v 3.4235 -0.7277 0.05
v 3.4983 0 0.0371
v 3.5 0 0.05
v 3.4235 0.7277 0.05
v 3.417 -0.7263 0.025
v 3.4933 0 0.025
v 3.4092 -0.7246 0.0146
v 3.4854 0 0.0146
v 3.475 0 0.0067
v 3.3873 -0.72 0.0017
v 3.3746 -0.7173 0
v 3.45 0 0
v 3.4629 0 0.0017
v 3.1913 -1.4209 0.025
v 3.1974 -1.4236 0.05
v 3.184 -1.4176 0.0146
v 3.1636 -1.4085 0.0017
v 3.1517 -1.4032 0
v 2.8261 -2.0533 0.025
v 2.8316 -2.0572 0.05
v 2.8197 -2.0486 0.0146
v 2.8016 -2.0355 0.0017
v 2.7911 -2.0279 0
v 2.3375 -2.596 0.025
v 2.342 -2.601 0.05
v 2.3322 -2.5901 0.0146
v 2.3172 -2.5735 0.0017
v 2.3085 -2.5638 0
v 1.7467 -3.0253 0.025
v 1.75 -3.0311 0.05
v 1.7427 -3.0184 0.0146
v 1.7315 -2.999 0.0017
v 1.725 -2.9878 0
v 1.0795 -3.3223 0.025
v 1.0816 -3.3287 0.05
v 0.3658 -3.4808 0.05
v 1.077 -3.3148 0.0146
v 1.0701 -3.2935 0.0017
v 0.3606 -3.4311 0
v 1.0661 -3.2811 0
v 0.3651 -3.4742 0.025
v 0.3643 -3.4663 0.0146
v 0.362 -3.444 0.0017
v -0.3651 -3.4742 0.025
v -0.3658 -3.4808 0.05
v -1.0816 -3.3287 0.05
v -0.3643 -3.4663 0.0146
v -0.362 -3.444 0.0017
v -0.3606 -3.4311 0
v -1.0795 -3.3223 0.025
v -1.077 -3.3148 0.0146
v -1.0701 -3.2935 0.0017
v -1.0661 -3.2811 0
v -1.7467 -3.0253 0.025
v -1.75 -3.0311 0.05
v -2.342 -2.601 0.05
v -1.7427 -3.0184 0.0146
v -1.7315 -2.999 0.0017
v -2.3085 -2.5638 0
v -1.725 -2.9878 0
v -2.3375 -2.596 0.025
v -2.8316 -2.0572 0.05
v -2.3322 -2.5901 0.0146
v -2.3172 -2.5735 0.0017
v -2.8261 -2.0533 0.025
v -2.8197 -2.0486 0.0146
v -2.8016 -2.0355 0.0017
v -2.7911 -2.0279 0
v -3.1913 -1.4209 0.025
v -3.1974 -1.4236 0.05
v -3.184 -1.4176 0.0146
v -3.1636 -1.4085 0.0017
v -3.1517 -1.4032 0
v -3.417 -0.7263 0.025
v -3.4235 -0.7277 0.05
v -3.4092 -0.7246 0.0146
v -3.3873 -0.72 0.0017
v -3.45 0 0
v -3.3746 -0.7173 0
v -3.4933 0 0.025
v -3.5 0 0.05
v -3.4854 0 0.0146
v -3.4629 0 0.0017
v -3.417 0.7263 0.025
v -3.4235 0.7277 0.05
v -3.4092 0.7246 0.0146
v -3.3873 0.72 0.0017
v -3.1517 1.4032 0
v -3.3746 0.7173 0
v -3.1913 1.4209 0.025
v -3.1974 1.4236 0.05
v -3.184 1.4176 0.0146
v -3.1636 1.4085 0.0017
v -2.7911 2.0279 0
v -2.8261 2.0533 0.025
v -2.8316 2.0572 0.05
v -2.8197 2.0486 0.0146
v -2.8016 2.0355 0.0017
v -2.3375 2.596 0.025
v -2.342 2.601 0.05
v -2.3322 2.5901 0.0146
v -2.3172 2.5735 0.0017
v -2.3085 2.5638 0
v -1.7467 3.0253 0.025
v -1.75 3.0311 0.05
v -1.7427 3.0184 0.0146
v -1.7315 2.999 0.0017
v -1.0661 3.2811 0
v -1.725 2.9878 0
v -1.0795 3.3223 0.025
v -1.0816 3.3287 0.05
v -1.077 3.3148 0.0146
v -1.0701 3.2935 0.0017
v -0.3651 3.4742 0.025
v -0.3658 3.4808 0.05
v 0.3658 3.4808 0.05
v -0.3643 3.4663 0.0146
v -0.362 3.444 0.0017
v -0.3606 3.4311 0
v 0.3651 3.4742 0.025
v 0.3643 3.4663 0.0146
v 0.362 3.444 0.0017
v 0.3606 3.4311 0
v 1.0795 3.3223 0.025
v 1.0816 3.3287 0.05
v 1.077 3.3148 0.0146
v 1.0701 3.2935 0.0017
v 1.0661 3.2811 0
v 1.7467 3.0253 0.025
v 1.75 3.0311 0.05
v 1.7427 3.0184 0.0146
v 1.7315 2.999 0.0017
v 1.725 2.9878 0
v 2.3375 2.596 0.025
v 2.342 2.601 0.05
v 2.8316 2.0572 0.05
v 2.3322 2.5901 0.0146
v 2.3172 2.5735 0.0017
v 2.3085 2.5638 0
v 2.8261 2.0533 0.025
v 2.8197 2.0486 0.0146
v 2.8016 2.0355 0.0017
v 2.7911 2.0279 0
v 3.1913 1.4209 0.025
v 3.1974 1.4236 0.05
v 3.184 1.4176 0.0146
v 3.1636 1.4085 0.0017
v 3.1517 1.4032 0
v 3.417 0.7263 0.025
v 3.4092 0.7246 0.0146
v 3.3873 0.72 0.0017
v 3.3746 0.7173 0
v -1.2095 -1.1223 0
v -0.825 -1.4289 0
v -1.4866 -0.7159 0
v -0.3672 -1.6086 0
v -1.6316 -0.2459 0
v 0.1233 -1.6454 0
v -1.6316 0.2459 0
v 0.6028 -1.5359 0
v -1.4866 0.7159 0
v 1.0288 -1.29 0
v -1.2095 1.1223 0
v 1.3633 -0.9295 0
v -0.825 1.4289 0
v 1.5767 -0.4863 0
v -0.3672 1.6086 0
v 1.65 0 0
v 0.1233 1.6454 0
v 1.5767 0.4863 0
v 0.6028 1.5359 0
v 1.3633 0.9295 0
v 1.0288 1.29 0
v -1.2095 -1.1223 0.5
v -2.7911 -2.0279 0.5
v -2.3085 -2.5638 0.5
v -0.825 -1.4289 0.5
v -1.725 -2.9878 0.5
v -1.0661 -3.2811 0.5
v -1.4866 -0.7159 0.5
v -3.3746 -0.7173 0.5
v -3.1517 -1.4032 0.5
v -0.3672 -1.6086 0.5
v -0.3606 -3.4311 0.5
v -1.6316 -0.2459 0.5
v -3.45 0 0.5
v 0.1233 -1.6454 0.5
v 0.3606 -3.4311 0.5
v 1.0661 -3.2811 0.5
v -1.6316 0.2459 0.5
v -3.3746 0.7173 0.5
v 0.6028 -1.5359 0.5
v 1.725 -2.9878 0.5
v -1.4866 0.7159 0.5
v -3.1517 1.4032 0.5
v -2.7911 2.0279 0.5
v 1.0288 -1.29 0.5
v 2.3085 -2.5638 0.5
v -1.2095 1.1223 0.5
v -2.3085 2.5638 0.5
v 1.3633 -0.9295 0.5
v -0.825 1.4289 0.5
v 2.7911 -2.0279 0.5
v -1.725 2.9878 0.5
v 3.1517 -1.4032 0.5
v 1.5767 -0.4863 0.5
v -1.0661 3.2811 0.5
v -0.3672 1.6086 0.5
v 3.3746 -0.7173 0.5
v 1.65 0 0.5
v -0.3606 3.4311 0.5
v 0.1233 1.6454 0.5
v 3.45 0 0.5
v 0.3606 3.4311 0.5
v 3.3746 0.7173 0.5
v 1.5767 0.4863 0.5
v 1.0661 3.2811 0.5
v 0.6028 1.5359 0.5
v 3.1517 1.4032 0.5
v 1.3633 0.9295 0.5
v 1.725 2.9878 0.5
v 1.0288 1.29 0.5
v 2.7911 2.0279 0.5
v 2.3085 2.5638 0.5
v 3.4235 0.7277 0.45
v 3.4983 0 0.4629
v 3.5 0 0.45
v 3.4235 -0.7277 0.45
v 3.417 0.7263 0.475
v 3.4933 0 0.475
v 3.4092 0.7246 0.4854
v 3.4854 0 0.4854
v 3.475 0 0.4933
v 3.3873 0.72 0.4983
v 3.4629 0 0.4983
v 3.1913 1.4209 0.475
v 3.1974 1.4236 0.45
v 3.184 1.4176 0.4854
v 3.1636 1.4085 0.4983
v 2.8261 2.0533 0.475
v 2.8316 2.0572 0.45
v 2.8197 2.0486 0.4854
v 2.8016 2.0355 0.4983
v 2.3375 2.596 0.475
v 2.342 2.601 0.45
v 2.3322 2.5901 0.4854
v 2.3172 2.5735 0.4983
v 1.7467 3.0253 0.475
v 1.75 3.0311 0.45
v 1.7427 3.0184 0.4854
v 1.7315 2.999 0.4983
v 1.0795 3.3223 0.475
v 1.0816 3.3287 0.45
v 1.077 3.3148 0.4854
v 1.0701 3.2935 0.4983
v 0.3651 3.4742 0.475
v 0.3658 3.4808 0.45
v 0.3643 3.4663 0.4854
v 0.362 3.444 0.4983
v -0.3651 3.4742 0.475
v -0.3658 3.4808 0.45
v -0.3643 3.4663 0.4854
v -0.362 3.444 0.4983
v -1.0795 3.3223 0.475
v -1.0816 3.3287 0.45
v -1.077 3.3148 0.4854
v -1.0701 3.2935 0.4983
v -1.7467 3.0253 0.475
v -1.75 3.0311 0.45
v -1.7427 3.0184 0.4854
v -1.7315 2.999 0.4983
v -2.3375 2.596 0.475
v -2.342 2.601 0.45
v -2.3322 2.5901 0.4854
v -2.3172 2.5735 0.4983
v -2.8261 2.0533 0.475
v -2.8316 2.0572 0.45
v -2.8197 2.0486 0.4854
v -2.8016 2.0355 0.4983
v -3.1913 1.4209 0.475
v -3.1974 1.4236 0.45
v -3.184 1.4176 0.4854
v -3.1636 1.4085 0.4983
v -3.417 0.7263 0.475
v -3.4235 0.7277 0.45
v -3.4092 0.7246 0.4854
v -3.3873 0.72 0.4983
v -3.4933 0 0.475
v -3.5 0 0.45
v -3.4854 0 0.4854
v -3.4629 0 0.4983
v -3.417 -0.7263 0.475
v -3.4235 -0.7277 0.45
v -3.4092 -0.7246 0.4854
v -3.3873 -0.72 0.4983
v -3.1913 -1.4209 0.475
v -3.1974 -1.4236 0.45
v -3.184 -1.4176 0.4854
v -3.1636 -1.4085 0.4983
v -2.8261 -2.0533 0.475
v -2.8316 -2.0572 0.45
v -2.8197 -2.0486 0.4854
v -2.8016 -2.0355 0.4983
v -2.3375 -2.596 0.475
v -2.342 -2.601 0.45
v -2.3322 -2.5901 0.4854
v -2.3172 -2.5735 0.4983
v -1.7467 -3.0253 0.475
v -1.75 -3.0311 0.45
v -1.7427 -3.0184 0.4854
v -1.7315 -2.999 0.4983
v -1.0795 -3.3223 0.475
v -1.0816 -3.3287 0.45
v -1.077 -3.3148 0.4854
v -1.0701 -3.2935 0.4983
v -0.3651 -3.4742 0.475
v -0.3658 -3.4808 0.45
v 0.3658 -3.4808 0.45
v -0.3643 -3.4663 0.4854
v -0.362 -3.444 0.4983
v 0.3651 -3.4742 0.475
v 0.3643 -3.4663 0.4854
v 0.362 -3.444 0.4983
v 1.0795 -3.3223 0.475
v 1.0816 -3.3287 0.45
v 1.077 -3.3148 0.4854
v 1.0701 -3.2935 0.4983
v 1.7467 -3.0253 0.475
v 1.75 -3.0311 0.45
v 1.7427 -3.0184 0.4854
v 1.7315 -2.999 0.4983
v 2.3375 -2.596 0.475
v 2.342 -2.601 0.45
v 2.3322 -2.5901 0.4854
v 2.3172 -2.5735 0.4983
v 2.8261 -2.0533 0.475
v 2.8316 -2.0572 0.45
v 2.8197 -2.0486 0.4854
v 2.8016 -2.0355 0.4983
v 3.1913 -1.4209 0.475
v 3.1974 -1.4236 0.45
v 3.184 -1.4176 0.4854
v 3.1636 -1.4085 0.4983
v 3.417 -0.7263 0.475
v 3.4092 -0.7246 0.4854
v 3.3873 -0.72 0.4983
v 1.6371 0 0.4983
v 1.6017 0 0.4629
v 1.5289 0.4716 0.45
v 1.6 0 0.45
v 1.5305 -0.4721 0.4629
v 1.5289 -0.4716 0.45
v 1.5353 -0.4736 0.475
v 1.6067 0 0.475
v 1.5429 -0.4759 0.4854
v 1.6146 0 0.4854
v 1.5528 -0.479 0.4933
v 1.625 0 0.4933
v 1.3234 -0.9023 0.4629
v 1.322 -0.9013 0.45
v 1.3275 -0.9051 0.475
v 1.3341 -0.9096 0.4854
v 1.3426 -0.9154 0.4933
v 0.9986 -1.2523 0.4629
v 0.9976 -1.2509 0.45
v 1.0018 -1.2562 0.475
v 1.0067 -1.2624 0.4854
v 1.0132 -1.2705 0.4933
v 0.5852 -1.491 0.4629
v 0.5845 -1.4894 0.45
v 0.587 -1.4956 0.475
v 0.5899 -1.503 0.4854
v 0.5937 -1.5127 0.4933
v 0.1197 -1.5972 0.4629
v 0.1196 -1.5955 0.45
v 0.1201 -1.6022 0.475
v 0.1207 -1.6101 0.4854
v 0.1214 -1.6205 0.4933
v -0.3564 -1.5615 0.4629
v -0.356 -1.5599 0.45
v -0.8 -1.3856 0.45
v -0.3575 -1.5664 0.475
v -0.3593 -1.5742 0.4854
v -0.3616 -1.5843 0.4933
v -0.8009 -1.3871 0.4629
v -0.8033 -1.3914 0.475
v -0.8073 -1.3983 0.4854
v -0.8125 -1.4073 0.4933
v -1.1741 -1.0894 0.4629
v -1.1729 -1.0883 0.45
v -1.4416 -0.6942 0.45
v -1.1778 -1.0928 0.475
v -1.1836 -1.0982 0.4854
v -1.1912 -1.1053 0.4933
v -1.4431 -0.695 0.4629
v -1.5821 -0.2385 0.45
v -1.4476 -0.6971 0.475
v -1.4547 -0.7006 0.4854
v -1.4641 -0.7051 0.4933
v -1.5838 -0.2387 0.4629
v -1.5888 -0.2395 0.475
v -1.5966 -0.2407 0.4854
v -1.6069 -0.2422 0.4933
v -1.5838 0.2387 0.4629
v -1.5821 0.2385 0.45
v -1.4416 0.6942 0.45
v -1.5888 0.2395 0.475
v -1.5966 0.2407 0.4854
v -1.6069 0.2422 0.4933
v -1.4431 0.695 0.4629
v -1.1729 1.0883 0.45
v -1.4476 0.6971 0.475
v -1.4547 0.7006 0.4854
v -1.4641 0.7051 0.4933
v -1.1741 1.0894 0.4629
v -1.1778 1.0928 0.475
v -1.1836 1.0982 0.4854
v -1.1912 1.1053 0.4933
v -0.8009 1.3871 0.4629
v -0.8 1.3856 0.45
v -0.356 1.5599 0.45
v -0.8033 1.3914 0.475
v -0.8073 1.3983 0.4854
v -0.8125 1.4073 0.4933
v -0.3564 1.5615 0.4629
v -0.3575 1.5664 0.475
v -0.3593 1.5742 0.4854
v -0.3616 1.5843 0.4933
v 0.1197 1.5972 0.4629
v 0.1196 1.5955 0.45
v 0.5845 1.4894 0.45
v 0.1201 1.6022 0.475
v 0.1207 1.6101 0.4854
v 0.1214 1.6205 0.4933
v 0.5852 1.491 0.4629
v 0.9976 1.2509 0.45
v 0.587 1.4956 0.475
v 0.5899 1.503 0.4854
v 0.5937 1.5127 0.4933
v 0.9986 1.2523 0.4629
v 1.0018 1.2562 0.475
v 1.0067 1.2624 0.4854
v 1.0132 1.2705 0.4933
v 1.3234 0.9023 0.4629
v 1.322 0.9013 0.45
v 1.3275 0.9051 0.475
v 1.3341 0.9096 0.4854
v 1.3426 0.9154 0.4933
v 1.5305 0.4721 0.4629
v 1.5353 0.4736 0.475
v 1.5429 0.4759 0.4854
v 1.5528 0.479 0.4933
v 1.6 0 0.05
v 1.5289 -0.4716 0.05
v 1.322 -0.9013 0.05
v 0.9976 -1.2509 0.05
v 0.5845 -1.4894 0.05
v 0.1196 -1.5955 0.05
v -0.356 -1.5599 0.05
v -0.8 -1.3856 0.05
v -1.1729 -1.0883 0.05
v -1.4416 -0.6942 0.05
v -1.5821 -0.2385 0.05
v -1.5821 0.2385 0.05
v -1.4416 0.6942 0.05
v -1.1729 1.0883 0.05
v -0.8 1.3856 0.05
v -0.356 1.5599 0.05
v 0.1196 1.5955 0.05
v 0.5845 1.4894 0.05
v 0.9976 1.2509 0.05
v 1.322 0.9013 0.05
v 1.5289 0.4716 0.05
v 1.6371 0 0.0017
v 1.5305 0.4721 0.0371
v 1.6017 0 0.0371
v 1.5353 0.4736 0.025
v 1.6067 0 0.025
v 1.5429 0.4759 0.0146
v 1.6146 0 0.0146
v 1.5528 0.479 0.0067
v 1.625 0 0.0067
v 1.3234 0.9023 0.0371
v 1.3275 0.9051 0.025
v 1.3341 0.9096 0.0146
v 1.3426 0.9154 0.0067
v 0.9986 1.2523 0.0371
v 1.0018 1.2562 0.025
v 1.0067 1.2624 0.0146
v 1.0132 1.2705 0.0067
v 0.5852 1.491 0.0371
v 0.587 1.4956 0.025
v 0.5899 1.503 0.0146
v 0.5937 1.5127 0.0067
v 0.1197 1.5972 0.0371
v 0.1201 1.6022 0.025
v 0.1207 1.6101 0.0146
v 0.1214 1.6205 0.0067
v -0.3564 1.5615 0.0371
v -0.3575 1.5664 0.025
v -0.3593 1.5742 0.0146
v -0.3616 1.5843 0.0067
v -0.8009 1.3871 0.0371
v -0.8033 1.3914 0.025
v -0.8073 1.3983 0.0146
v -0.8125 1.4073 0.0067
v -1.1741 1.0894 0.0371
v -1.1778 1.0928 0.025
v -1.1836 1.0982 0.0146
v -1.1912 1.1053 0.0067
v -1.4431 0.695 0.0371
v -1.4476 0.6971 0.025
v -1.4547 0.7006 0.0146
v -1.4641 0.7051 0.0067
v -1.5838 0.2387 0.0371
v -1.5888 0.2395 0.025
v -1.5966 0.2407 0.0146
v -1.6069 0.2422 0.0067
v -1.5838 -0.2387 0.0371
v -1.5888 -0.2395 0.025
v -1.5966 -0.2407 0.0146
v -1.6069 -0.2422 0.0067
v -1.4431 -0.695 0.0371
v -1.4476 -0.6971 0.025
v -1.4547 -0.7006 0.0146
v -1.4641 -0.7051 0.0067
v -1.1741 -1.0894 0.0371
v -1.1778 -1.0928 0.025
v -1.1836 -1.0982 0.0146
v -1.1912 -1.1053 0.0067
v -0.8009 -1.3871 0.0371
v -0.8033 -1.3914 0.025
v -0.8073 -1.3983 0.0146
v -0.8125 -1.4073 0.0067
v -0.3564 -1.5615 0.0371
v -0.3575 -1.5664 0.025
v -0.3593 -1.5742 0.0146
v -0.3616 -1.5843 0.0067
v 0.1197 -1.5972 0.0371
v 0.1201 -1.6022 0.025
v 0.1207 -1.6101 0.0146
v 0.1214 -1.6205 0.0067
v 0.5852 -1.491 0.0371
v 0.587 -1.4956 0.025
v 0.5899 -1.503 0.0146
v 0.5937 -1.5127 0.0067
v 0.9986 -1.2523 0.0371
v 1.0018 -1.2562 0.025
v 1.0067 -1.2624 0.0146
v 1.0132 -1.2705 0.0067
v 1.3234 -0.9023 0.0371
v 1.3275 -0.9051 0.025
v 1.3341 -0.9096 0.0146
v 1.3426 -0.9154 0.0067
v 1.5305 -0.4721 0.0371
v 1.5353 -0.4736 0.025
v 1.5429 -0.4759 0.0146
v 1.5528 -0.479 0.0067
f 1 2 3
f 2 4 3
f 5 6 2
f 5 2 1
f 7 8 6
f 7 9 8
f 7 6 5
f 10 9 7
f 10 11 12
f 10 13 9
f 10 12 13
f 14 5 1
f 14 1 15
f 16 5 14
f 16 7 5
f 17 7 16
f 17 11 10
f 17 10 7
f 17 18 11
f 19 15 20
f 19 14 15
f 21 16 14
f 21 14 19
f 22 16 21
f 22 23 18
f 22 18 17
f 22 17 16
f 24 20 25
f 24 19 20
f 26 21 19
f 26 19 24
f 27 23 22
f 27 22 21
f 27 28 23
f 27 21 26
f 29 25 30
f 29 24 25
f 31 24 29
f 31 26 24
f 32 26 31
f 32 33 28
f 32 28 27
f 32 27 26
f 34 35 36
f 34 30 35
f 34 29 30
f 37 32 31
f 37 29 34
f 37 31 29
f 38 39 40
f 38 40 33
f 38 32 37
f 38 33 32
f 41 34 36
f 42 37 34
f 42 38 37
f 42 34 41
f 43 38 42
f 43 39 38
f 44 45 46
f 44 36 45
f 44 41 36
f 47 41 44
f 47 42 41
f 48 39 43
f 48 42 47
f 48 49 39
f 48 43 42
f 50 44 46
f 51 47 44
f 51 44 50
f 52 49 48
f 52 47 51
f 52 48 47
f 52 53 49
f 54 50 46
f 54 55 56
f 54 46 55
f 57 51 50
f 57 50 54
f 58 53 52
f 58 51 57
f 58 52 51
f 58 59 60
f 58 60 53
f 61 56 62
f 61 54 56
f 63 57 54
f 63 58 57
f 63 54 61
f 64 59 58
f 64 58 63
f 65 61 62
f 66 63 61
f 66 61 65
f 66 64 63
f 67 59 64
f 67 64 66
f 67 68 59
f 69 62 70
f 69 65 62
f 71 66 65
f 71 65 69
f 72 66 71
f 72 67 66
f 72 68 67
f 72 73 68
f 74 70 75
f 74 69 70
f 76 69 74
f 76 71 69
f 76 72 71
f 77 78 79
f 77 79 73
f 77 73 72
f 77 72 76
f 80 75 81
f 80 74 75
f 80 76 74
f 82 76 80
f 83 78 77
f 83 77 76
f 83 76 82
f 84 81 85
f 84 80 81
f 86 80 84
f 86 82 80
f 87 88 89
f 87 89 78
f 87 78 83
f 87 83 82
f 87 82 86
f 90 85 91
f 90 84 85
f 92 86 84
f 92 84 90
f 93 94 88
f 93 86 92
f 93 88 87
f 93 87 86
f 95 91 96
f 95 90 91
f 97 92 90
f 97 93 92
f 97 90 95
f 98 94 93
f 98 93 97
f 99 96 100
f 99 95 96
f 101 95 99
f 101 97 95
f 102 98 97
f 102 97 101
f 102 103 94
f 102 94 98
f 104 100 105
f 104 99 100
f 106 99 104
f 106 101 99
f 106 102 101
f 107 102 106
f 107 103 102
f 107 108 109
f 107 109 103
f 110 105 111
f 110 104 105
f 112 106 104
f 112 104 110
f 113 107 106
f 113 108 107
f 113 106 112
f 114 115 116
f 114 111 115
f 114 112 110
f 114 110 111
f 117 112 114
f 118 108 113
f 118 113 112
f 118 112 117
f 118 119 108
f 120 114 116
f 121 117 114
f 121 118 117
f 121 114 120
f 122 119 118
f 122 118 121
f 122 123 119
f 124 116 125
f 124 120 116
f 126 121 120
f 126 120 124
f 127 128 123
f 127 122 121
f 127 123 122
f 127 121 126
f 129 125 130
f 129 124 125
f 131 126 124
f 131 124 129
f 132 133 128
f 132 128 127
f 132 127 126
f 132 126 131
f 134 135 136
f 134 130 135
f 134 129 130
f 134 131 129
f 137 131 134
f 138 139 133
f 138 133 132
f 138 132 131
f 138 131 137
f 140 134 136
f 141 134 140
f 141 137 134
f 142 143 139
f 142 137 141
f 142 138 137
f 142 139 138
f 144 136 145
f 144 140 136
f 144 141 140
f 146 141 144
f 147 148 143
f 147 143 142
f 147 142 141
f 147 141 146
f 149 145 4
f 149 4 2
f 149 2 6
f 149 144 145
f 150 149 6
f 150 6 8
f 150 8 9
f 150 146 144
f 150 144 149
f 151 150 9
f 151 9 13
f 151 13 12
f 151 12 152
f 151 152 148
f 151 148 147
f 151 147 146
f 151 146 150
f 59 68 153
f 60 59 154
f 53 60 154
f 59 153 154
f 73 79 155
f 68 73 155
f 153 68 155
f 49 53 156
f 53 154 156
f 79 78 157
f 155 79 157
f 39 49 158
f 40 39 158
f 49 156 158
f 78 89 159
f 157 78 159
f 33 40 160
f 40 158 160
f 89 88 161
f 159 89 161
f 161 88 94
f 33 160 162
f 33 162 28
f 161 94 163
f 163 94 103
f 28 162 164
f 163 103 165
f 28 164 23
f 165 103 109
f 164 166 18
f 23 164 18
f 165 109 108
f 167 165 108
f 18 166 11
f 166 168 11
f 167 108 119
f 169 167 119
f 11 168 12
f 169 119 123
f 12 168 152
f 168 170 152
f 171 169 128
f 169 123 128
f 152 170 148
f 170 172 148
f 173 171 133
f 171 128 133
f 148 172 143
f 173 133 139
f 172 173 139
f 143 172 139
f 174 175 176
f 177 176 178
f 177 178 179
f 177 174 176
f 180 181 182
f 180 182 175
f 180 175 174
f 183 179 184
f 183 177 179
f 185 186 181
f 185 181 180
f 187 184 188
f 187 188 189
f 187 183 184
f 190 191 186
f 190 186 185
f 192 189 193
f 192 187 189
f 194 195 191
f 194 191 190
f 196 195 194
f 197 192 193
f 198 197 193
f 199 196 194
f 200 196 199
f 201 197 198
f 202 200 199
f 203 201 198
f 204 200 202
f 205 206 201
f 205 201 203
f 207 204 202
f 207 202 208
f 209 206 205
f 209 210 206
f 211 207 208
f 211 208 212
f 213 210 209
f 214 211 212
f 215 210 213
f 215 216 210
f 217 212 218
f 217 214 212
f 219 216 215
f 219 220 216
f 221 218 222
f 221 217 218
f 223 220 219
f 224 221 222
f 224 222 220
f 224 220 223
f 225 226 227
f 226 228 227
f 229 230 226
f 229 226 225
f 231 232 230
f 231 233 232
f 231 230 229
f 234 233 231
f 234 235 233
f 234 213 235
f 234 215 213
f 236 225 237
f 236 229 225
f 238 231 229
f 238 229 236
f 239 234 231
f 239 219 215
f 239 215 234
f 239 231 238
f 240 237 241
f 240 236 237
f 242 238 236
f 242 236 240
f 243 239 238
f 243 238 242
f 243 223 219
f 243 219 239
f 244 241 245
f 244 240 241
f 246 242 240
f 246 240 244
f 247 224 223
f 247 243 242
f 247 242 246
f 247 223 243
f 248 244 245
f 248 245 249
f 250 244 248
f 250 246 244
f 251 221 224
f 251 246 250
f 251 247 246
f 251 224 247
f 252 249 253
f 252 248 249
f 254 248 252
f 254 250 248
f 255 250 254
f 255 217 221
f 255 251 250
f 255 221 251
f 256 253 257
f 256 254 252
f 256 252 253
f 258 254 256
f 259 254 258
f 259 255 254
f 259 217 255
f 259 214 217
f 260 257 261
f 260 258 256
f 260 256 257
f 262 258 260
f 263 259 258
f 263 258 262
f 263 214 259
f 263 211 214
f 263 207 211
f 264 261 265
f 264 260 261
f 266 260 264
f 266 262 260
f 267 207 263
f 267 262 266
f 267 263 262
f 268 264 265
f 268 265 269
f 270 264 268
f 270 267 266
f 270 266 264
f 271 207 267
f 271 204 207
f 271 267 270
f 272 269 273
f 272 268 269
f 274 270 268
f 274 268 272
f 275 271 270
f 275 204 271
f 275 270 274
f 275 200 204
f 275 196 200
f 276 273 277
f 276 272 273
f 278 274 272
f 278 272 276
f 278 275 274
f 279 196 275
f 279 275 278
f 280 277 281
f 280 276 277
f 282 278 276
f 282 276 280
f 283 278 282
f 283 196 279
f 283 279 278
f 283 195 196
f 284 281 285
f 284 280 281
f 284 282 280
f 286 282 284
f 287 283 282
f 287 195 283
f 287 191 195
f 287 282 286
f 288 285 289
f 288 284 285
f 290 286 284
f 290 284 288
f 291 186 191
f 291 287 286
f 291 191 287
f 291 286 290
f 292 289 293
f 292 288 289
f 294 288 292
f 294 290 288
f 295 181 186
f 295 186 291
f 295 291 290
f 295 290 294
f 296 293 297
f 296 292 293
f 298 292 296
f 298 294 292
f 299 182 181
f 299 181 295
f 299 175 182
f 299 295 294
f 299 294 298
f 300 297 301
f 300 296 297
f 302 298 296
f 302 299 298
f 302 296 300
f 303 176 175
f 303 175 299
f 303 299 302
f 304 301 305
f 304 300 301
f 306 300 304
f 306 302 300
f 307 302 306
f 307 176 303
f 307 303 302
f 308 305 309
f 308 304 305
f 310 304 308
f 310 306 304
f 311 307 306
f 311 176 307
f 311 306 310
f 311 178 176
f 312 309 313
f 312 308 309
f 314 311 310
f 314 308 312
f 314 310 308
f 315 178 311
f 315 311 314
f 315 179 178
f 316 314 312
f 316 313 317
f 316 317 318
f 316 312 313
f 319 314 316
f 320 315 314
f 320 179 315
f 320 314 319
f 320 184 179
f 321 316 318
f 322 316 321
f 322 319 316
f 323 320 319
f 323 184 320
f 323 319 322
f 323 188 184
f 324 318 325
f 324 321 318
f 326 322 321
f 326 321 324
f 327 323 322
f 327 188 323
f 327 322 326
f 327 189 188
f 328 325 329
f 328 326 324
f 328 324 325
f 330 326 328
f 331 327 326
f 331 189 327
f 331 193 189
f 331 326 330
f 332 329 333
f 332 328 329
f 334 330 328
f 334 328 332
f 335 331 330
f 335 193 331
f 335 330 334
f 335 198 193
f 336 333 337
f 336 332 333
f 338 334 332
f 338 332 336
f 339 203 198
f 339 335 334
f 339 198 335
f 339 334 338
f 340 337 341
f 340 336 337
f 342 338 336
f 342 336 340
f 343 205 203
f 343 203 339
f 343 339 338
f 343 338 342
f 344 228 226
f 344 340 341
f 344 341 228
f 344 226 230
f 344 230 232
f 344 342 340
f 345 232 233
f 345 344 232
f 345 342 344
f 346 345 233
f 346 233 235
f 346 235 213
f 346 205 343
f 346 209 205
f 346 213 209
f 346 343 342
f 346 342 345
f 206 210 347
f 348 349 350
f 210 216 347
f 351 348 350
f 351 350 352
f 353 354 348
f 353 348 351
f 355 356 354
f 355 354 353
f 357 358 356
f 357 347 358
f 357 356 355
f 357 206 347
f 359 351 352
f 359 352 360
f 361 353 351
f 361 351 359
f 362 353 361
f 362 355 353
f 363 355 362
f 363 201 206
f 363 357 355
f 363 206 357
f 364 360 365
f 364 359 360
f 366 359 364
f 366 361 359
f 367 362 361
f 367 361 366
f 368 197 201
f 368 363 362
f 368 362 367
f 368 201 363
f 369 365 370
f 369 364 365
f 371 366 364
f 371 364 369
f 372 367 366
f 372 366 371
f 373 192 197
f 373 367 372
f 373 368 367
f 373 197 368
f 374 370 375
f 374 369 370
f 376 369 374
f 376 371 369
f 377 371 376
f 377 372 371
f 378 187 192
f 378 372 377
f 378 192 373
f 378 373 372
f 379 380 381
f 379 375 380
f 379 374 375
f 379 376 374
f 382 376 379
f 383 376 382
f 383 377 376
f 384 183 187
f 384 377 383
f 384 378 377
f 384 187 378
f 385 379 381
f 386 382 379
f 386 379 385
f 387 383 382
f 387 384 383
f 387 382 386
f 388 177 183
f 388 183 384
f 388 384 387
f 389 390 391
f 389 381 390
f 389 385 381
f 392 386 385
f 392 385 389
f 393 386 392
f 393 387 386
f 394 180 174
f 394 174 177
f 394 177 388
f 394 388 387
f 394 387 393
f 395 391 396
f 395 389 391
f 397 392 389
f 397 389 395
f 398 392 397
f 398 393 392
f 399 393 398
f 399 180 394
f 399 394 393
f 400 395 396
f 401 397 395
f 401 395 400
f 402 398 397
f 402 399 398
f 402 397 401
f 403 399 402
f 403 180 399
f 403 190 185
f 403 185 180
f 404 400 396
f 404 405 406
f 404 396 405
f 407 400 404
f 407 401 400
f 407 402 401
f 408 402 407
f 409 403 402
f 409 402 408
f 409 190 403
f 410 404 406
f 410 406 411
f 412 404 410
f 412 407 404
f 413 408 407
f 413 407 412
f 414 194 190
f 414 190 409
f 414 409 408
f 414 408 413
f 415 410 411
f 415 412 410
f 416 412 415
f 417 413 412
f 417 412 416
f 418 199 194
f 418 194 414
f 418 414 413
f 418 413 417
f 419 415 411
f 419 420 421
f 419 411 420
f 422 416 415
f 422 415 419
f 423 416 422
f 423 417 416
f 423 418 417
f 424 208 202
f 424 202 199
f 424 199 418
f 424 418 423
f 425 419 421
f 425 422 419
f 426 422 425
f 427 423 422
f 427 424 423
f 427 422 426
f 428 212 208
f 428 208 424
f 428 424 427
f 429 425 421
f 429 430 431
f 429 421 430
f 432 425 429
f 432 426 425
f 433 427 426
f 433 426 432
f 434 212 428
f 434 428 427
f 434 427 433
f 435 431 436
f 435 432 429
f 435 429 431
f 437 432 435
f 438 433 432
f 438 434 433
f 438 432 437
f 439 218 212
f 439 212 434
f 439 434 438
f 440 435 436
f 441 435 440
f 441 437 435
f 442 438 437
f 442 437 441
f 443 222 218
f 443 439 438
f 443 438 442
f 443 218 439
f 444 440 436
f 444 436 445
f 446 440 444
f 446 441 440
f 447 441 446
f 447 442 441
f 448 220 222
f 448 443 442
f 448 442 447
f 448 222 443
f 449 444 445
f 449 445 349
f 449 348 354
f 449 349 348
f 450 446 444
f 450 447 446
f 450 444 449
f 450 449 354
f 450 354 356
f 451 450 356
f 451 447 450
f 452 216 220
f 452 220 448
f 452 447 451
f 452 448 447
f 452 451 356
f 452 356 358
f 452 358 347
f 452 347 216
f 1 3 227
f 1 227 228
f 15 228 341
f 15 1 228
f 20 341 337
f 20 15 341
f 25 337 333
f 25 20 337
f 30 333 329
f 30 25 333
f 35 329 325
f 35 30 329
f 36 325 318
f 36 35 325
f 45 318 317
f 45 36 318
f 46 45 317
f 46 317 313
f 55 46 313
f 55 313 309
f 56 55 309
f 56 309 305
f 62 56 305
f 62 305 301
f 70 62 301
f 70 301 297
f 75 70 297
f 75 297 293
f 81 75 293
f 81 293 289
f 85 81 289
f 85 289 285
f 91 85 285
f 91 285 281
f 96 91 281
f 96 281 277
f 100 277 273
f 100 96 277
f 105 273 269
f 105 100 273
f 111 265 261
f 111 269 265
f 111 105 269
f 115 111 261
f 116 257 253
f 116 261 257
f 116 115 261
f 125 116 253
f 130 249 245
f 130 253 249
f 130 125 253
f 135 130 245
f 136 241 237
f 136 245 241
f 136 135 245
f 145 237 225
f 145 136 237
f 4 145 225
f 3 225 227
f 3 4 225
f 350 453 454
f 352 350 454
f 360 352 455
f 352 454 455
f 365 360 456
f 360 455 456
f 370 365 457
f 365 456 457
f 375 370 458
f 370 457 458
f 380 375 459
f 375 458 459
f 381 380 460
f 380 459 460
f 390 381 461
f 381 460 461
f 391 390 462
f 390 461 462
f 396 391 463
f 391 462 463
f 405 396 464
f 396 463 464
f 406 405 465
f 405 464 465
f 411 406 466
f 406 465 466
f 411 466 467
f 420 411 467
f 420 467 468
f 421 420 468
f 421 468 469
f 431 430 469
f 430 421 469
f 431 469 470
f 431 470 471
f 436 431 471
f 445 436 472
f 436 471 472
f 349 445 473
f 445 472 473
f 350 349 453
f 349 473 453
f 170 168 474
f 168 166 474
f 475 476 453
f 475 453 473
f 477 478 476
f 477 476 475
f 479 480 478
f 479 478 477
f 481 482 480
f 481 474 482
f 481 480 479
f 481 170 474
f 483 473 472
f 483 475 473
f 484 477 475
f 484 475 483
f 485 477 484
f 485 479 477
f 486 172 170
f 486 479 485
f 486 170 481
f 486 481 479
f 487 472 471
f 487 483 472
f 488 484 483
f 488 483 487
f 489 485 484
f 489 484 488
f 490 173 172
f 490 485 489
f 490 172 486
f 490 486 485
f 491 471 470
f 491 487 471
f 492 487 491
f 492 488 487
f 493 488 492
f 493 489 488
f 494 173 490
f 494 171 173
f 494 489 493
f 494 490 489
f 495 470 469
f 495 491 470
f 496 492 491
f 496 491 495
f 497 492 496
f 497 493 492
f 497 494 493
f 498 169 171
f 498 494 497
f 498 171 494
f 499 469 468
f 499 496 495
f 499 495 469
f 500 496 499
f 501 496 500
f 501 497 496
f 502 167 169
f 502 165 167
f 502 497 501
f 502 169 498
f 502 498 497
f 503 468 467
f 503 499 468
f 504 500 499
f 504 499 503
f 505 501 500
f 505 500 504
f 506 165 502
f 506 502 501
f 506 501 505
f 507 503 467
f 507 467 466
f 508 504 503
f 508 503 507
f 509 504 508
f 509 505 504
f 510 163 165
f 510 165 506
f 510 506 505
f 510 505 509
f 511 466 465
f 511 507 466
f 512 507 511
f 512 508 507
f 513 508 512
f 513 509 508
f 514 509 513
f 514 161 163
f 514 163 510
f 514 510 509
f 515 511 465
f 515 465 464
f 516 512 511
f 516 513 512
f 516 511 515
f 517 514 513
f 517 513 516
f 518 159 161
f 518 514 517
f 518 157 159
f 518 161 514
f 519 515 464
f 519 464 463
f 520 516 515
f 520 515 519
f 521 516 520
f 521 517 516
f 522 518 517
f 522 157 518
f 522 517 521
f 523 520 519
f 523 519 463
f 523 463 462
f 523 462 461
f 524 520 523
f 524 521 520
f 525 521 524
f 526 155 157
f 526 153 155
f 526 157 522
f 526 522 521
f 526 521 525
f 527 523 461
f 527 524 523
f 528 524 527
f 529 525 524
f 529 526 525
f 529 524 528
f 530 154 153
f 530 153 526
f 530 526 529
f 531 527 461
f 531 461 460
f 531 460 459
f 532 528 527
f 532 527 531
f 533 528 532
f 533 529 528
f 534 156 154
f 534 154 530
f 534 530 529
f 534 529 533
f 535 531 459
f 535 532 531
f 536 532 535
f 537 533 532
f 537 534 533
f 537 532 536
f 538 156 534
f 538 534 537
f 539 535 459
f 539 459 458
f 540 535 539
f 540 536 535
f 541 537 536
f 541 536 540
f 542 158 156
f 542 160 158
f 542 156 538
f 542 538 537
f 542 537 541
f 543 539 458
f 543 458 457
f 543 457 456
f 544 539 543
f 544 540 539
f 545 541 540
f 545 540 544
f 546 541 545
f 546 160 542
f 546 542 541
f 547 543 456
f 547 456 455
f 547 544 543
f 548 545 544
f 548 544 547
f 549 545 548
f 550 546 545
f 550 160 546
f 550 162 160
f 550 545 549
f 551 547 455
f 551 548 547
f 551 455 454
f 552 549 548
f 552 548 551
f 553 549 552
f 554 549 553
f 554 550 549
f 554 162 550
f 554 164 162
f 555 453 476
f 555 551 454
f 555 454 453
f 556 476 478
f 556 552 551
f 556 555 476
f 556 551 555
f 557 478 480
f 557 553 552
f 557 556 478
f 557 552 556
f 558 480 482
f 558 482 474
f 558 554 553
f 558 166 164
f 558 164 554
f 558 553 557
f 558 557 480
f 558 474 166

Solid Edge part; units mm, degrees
sketch "Sketch1" plane through (0, 0, 0) normal (0, 0, 1) x (1, 0, 0)
  circle A0 centre (0, 0) radius 1.6
  circle A1 centre (0, 0) radius 3.5
  dimension "D1" = 7
  dimension "D2" = 3.2
extrude "Protrusion1" add sketch "Sketch1" along normal blind 0.5
fillet "Round_Edges" radius 0.05 4 edges at (-3.5, 0, 0.5) (-3.5, 0, 0) (-1.6, 0, 0.5) (-1.6, 0, 0)
properties material "Nylon, general purpose"
